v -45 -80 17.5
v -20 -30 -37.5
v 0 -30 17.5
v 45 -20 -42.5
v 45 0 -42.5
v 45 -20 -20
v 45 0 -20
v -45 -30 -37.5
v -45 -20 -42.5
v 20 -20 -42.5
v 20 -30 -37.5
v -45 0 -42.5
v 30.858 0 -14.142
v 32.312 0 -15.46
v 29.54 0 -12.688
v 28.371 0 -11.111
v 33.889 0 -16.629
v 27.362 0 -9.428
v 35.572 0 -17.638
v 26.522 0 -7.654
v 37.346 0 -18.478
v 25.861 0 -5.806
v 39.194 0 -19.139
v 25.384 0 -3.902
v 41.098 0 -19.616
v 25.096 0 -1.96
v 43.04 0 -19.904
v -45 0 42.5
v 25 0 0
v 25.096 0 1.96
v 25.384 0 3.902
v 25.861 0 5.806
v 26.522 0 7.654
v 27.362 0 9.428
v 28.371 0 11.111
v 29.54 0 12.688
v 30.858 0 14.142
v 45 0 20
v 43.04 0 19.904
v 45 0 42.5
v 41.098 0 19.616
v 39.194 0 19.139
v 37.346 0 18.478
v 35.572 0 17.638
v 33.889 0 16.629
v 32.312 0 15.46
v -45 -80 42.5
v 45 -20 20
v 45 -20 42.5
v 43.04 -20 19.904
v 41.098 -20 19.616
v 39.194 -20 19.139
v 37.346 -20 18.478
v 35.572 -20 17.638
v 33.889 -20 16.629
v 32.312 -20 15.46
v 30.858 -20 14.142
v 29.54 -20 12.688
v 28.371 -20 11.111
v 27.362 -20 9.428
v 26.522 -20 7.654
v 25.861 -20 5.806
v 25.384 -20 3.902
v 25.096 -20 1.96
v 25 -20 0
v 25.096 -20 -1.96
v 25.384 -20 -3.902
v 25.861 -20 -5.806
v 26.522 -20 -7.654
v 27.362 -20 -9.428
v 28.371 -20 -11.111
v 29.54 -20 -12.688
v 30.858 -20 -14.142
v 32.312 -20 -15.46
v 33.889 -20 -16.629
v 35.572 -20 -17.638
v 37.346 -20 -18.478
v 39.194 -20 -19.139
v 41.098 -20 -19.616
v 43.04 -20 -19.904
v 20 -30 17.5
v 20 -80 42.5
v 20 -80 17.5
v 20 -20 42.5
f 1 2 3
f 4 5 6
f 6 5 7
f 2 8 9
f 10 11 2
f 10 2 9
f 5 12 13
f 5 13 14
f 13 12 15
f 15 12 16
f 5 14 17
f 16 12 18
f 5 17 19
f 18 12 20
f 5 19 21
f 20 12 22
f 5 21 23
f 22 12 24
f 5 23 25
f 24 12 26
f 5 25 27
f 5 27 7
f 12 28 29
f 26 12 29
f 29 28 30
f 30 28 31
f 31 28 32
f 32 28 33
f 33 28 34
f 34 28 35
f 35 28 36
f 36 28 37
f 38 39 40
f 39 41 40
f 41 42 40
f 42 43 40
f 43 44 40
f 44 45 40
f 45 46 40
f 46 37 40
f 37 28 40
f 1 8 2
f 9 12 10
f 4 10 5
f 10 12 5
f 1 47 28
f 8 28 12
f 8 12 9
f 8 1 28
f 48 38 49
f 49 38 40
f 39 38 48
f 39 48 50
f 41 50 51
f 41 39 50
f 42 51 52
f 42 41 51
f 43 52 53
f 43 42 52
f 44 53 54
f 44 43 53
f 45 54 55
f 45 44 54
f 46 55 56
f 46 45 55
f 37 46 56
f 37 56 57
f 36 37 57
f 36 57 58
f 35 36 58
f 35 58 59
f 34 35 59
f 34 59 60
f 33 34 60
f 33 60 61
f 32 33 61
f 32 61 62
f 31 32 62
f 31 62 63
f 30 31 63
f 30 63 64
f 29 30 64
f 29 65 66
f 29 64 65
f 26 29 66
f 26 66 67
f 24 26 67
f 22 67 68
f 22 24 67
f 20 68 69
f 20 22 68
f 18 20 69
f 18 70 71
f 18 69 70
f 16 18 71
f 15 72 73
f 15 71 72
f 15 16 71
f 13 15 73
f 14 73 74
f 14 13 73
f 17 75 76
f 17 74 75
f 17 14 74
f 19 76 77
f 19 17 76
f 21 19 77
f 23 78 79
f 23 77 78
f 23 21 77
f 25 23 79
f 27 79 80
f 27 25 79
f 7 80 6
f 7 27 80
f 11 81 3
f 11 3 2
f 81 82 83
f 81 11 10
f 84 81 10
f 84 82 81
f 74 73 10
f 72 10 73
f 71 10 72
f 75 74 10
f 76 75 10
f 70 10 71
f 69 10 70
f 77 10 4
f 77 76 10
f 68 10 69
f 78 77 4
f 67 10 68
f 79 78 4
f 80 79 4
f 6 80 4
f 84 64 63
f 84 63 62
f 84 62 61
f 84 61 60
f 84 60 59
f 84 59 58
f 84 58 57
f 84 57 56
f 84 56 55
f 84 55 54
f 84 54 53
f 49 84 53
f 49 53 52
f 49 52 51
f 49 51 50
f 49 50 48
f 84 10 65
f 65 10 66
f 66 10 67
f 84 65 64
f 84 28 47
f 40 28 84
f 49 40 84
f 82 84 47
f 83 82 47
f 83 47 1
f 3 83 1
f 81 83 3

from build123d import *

# Parameters (mm, degrees)
F0_W     = 90
F0_H     = 85
F1_DEPTH = 20
F3_DEPTH = 25
F6_DEPTH = 65


with BuildPart() as f1:
    # F0 (on Front) → F1 (new body)
    with BuildSketch(Plane.XZ):
        Rectangle(F0_W, F0_H)
    extrude(amount=F1_DEPTH)

    # F2 (on Front) → F3 (cut)
    with BuildSketch(Plane.XZ):
        with BuildLine():
            Line((45, -20), (45, 20))
            ThreePointArc((45, 20), (25, 0), (45, -20))
        make_face()
    extrude(amount=F3_DEPTH, mode=Mode.SUBTRACT)

    # F5 (on offset) → F6 (join)
    with BuildSketch(Plane.YZ.offset(20)):
        Polygon((-20, 20), (-20, 42.5), (-80, 42.5), (-80, 17.5), (-30, 17.5), (-30, -37.5), (-20, -42.5), (-20, -20), align=None)
    extrude(amount=-F6_DEPTH)

    # F8 (on face) → F10 section 0
    with BuildSketch(Plane.XZ.offset(30), mode=Mode.PRIVATE) as f10_s0:
        Polygon((-45, -37.5), (-20, -37.5), (0, 17.5), (-45, 17.5), align=None)
    loft([f10_s0.sketch, Vertex(-45, -80, 17.5)])


solid = f1.part
